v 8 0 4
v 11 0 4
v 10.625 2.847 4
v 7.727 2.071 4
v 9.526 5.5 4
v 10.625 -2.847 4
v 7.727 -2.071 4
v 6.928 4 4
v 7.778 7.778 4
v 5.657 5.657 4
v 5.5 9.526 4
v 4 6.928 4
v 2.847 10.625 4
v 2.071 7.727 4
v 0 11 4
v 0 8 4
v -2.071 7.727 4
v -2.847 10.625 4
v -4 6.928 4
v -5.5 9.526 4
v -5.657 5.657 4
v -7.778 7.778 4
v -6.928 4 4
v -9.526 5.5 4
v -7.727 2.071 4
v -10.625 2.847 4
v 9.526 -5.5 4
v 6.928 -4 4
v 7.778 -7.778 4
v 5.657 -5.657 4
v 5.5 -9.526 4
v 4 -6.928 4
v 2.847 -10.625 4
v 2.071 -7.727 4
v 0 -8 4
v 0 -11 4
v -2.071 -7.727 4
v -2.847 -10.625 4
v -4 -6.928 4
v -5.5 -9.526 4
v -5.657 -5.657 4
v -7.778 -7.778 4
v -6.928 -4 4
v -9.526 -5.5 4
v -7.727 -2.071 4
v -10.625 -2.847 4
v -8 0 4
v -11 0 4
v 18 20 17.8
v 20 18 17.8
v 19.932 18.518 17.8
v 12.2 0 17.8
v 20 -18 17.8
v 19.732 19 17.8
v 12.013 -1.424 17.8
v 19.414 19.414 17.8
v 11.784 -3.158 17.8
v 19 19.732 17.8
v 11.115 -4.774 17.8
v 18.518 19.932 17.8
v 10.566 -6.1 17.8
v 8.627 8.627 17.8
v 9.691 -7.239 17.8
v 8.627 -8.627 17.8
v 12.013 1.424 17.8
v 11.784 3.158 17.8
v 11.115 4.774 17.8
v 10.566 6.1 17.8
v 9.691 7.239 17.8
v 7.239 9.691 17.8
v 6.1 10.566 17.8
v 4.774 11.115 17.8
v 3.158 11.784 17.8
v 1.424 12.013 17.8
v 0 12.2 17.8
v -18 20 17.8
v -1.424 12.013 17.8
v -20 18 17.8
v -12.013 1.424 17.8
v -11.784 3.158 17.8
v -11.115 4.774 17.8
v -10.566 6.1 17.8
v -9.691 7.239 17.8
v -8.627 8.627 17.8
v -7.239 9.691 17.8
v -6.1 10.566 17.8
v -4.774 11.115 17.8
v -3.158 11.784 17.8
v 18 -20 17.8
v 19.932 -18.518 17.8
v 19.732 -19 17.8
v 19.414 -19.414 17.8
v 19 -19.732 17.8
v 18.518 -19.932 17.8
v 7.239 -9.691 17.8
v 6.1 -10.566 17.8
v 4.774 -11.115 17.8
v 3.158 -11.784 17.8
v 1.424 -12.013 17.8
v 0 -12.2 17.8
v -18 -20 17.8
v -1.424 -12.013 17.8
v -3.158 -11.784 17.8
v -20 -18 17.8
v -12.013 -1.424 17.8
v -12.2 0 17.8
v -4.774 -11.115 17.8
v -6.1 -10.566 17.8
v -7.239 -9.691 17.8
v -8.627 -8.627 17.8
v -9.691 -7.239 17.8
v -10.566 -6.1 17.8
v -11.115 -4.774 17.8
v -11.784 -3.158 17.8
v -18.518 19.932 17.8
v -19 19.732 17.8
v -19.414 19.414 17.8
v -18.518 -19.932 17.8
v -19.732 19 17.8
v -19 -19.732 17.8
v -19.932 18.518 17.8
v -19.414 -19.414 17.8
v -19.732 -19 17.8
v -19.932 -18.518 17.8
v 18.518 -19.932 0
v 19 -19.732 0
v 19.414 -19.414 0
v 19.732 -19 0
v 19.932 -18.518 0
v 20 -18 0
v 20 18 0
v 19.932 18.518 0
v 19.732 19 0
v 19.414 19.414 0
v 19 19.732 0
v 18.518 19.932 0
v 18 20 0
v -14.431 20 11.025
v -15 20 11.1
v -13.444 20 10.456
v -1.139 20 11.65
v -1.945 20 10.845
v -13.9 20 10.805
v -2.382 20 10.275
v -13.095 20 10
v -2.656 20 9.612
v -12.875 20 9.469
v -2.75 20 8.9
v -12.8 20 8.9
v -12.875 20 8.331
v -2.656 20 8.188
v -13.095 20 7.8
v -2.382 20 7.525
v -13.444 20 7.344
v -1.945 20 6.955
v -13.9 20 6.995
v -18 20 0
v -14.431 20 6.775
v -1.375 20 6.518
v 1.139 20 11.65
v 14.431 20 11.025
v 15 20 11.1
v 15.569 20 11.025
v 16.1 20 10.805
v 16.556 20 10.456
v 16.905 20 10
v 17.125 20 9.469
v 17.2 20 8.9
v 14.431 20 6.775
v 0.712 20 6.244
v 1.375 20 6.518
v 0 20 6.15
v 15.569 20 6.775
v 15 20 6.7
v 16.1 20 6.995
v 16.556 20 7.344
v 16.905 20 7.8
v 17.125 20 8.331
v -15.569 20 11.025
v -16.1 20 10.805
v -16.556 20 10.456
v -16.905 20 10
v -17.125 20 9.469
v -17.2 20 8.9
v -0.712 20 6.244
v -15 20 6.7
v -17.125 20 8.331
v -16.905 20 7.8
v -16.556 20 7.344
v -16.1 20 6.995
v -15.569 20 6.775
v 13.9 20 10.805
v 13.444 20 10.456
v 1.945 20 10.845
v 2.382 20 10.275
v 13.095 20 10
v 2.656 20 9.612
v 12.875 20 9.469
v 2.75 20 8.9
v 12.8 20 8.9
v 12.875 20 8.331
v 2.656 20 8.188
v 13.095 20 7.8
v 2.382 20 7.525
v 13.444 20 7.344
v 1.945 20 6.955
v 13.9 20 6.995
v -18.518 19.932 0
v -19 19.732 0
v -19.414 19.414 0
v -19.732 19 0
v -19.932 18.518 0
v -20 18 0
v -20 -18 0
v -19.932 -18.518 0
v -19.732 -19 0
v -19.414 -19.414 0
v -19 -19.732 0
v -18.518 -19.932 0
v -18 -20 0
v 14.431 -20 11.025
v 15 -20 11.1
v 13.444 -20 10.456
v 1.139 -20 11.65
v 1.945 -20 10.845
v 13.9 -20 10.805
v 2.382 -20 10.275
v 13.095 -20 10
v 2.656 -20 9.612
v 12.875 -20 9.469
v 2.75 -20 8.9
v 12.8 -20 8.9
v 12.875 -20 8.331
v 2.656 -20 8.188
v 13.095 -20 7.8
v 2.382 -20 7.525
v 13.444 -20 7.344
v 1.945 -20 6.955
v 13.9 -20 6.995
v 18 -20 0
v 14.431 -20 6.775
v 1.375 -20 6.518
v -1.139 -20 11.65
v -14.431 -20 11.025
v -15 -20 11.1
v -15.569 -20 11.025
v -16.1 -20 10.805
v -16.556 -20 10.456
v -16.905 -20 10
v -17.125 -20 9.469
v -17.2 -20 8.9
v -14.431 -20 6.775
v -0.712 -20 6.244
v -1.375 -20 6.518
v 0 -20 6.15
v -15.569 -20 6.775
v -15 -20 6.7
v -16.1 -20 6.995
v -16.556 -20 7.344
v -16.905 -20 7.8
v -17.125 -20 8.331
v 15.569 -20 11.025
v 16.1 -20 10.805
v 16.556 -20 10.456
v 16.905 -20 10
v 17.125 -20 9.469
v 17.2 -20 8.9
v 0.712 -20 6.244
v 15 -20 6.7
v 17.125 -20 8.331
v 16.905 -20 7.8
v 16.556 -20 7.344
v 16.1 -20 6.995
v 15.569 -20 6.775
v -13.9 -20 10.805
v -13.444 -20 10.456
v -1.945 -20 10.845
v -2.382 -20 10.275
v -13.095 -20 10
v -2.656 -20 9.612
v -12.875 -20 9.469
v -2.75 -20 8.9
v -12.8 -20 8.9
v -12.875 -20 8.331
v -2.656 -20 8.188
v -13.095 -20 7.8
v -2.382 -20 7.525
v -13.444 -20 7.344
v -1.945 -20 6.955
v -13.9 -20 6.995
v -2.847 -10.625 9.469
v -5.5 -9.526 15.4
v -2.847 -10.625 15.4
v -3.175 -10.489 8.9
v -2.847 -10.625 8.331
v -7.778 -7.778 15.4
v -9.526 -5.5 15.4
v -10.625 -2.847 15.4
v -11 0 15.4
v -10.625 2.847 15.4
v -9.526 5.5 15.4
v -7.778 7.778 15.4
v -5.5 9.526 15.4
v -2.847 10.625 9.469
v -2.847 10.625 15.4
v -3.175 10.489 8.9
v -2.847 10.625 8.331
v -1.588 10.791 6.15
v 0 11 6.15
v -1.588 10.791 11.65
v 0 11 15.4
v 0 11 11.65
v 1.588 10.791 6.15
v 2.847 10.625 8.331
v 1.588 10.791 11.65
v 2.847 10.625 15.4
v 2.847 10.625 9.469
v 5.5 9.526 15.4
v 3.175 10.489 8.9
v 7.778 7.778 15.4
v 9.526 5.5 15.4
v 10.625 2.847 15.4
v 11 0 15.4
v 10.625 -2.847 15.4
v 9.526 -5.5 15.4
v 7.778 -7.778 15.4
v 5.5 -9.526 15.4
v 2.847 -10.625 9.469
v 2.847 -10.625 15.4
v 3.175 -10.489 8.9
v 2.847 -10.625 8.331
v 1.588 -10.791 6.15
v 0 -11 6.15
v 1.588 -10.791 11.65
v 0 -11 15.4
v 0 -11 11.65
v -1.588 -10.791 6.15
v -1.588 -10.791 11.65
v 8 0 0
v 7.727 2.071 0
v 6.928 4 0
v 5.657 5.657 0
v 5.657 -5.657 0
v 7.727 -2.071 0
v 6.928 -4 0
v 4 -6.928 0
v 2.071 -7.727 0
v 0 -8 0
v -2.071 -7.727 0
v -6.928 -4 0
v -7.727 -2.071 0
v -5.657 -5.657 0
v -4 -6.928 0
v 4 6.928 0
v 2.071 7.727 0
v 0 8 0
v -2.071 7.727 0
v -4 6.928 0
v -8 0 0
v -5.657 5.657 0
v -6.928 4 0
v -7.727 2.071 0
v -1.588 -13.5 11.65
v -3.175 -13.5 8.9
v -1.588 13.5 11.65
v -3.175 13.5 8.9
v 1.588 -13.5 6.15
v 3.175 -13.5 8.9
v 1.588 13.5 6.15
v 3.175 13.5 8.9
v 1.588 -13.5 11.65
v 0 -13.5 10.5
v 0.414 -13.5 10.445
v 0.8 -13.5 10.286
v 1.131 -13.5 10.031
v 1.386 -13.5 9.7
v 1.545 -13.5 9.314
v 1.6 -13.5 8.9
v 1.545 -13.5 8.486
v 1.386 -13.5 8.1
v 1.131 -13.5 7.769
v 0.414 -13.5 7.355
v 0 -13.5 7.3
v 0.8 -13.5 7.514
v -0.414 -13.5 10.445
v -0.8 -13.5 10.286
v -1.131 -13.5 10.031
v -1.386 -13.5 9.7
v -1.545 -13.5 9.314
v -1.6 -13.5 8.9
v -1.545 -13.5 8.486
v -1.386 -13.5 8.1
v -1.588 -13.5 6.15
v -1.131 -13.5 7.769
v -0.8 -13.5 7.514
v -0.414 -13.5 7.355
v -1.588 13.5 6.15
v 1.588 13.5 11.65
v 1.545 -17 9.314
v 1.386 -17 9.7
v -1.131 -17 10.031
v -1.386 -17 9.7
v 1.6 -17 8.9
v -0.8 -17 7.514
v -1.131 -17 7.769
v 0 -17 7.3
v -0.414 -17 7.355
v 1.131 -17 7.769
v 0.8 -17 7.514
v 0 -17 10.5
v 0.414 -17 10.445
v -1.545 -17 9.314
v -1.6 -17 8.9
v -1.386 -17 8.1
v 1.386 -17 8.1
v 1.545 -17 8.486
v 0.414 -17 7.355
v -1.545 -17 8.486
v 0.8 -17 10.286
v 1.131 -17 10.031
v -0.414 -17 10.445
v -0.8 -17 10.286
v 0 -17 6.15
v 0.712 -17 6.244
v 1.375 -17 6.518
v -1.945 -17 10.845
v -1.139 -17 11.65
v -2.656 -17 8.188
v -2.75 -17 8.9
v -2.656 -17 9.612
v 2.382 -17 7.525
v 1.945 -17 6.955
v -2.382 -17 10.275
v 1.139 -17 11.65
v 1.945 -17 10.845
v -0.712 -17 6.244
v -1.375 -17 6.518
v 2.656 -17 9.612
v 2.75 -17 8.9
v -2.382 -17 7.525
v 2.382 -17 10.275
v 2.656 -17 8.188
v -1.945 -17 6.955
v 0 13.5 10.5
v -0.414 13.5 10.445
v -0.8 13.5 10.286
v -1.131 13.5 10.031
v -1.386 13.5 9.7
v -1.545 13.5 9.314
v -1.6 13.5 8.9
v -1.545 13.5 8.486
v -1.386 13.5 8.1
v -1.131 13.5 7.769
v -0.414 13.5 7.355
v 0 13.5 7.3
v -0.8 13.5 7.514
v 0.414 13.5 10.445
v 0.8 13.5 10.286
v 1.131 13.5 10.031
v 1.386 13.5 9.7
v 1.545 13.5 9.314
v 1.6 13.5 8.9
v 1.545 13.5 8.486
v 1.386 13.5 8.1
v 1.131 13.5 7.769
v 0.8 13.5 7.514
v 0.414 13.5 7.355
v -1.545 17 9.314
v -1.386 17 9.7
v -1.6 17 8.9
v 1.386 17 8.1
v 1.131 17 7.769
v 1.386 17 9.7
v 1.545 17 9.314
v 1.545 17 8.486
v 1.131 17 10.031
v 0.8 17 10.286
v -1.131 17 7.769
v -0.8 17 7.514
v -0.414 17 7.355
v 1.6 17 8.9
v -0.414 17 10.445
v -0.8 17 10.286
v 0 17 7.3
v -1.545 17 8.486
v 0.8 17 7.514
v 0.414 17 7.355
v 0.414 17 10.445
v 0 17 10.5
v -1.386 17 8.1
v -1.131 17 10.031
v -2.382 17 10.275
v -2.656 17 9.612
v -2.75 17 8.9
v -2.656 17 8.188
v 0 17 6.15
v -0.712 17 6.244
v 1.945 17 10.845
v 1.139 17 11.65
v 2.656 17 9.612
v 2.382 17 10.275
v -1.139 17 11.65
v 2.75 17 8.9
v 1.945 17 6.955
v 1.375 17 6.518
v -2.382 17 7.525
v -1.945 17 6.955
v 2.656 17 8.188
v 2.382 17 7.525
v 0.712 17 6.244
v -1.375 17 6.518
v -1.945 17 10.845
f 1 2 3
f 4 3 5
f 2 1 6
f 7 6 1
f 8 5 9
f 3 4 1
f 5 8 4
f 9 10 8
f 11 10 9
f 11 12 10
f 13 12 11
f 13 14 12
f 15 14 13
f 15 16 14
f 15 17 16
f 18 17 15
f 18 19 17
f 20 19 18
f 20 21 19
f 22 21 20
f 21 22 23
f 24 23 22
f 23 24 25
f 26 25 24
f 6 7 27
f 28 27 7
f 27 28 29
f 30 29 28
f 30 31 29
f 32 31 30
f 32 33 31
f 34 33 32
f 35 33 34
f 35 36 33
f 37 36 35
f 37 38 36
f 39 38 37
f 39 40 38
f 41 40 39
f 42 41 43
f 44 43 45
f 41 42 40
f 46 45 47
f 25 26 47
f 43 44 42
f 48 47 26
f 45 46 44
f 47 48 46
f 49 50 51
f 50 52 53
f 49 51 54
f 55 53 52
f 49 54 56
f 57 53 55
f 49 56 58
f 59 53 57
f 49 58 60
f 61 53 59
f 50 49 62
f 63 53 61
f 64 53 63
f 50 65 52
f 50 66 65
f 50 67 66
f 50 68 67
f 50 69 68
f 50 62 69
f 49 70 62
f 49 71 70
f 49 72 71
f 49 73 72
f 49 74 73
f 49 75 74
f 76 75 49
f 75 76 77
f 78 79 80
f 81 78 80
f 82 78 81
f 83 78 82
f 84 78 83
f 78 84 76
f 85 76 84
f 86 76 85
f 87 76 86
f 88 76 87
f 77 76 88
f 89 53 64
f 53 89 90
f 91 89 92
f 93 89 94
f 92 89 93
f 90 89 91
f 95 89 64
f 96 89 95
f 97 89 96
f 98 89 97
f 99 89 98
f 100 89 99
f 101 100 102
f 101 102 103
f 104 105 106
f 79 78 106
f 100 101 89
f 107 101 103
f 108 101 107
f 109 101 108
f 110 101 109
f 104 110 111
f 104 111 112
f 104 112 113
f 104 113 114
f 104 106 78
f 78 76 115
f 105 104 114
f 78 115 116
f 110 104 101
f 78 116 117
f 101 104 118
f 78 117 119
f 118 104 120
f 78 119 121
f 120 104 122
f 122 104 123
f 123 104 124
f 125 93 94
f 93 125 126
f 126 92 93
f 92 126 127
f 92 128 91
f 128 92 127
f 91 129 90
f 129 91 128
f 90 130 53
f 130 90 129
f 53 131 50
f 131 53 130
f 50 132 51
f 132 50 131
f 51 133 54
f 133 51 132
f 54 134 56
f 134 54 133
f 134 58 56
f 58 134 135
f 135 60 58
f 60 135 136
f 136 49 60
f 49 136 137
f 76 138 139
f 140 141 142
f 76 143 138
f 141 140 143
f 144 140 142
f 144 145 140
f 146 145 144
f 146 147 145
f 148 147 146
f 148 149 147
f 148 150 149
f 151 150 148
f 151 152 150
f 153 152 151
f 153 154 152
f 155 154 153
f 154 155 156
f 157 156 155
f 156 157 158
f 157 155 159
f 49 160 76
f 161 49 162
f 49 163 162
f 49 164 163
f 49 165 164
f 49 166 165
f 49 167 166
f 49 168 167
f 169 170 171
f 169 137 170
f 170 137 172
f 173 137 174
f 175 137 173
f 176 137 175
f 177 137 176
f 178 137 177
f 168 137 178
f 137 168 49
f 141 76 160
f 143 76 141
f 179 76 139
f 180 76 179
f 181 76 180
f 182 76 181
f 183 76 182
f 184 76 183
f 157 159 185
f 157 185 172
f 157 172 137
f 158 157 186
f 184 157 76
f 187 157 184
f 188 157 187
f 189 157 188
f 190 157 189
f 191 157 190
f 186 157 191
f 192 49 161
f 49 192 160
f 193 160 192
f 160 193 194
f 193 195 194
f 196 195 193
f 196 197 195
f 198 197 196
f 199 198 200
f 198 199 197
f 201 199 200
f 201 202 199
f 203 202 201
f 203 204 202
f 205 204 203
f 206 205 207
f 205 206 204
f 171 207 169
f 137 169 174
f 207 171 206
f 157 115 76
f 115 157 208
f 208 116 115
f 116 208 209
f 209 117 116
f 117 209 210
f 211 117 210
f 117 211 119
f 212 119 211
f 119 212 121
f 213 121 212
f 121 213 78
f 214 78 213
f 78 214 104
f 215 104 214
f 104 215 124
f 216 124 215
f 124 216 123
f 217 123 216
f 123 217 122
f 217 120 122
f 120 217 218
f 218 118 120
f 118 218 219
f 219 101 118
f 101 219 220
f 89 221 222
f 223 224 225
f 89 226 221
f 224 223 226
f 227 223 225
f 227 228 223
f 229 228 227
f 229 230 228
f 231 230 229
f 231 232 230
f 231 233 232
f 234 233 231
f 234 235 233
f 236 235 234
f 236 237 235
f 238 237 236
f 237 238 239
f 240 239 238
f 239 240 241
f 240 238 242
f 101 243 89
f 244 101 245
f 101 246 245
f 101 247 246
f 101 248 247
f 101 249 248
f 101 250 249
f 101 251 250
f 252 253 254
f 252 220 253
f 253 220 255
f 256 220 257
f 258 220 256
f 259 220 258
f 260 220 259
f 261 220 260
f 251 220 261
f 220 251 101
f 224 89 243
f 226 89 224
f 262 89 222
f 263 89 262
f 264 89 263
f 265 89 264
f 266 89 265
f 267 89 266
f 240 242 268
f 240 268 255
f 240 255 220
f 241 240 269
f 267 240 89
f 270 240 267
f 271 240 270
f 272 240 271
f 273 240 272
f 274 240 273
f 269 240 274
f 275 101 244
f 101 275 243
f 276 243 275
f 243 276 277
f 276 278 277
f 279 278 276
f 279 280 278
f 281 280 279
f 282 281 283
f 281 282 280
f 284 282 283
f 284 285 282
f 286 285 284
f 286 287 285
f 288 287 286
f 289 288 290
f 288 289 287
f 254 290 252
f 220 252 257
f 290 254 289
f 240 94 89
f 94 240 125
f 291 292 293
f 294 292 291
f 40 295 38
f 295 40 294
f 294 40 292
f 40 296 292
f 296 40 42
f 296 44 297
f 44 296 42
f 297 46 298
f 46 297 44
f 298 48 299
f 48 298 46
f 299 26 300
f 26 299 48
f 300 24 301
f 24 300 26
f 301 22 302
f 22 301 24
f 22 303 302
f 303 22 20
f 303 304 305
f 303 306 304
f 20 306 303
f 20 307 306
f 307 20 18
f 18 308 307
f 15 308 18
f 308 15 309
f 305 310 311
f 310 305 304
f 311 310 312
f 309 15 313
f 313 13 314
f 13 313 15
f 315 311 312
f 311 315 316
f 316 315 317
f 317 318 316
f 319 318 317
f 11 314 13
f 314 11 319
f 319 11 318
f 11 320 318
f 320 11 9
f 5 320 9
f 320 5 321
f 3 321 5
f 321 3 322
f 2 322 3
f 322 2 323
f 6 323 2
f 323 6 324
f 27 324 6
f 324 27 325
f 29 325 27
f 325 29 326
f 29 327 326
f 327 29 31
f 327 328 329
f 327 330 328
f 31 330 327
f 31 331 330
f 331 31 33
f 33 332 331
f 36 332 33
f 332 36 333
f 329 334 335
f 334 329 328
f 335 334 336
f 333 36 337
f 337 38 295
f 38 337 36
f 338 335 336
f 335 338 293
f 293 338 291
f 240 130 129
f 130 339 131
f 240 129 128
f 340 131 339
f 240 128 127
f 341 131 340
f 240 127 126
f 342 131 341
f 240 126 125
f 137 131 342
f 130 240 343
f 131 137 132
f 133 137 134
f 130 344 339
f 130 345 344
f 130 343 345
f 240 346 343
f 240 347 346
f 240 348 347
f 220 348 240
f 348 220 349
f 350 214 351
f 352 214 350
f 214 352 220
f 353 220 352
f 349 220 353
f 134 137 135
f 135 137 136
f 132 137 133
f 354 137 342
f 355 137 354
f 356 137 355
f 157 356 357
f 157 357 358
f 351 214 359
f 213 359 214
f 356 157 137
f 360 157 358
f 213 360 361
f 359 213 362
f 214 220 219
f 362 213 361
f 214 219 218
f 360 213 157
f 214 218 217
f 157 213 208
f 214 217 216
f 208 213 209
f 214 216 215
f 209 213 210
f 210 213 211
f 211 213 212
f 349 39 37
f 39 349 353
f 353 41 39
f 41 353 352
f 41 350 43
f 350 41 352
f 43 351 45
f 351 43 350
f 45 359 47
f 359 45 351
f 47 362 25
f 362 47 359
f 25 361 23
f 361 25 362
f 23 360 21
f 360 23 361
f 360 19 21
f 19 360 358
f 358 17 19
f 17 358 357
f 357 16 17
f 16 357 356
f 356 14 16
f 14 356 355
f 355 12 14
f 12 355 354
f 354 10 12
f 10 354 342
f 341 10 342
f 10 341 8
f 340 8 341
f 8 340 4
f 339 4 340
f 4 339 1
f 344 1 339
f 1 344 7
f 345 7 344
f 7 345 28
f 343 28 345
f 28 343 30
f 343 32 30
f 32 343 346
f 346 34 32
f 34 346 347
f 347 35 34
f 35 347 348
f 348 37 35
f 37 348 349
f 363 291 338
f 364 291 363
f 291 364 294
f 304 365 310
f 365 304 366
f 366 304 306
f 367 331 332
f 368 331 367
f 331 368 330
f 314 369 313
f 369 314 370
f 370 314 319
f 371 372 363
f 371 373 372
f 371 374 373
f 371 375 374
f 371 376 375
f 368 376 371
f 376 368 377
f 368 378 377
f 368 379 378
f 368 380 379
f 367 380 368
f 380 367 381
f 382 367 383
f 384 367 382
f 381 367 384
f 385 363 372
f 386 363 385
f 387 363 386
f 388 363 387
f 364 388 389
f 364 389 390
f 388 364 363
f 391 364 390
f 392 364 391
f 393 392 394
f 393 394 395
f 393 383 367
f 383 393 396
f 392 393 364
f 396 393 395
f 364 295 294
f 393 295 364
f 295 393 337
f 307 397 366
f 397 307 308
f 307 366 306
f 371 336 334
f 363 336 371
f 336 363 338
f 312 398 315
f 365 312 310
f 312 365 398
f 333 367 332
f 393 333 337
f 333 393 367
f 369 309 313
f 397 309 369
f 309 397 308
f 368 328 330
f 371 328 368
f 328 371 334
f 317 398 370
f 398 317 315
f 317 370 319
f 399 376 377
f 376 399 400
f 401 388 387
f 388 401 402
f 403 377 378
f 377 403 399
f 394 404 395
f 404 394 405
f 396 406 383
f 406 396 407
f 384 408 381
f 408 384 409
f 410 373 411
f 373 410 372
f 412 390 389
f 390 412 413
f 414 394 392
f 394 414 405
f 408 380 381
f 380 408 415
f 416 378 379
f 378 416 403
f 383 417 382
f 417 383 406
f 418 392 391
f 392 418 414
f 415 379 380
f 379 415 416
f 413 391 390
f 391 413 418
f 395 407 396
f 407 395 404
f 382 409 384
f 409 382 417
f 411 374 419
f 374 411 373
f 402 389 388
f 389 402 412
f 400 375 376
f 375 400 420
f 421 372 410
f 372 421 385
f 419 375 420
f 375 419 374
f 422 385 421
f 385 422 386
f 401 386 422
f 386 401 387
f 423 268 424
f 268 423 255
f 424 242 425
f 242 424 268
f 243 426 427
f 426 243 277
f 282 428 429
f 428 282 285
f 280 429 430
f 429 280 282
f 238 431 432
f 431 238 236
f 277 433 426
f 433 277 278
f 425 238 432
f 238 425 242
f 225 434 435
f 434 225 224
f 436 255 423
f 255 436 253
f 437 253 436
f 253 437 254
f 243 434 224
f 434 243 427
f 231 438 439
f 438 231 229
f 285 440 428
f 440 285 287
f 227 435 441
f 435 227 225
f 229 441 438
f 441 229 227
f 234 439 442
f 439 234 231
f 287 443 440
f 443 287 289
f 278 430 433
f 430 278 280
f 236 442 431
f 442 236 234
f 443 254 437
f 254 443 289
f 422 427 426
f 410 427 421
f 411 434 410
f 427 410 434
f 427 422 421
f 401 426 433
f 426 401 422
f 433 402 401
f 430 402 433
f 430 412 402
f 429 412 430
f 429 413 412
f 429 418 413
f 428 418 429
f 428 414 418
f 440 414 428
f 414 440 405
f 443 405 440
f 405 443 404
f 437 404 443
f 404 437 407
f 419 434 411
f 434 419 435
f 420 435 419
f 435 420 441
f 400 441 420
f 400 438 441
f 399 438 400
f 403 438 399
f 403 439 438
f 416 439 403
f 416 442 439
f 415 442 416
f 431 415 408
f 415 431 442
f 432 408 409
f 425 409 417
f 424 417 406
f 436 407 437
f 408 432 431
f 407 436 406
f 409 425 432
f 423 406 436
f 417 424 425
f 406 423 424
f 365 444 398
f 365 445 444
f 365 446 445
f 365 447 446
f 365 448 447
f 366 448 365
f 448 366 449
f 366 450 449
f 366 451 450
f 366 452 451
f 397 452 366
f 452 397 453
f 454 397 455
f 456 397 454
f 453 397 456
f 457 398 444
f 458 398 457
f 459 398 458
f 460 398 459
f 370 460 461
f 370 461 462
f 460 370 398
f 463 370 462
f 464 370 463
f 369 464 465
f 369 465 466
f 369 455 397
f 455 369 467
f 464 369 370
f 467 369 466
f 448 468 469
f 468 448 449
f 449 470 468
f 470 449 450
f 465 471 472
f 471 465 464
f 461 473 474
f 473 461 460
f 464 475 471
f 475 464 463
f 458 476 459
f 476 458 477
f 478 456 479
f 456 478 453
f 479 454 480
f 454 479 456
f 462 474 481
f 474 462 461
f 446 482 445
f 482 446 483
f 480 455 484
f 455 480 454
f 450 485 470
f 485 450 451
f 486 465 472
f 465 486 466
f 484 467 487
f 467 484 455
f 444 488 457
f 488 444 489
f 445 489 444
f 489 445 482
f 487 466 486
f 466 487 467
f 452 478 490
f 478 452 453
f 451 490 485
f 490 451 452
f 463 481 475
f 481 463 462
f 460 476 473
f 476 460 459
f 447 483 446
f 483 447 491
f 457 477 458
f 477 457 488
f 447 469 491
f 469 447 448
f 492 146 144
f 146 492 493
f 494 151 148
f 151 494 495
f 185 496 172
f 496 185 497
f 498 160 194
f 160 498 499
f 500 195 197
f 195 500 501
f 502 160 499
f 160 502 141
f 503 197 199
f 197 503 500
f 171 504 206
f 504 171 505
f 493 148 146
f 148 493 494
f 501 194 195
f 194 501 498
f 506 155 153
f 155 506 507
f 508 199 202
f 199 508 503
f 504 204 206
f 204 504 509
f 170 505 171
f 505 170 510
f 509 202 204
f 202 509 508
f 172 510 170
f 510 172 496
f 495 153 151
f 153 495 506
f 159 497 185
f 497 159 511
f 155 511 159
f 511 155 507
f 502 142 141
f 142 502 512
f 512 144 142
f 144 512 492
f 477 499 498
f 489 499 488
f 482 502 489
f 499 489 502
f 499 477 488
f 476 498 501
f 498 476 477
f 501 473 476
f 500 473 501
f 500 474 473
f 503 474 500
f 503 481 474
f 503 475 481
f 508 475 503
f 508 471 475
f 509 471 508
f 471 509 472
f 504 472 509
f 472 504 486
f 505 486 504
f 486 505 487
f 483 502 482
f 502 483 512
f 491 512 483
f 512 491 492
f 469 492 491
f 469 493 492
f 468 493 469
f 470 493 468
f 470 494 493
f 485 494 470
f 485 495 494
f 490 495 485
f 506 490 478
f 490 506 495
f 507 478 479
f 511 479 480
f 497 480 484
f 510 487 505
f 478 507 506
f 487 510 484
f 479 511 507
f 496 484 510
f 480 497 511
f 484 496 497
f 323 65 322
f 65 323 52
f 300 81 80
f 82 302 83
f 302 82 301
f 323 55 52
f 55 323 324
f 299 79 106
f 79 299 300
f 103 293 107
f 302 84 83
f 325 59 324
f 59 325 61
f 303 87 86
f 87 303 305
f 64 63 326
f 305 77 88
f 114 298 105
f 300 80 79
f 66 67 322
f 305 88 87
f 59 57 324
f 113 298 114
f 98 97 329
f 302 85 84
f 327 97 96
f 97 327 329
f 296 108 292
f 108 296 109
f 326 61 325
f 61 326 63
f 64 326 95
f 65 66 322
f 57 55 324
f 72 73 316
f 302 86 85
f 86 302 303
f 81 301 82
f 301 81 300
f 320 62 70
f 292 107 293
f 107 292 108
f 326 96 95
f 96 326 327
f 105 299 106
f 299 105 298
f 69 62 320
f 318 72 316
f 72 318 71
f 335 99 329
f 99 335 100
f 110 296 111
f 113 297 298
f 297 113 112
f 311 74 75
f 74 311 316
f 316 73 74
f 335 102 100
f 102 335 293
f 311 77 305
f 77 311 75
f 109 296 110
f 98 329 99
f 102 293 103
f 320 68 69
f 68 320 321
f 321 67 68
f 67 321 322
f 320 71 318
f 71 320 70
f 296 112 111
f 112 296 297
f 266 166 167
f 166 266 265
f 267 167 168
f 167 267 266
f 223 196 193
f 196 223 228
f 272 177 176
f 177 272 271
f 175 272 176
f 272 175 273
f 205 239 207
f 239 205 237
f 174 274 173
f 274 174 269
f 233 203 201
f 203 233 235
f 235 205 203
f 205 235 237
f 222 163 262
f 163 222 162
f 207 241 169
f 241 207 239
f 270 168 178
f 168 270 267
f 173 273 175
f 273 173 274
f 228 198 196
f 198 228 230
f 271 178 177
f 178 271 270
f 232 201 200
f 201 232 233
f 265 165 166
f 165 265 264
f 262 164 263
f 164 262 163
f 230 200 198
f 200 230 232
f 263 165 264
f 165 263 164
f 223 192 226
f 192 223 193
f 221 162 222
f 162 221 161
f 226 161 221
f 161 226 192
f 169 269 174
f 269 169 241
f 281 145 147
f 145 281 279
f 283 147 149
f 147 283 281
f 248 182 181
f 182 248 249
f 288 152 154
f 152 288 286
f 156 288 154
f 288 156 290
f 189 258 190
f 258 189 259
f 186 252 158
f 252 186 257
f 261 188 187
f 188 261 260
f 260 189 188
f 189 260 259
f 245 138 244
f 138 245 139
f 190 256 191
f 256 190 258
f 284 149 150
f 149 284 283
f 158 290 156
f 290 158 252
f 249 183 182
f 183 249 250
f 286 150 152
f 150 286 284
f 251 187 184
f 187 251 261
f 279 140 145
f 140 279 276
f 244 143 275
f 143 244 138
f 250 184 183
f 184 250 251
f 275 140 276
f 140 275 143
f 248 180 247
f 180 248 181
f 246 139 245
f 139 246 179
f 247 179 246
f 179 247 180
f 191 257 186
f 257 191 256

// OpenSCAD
// Z-Bracket - Simple with Nut Holes

// højde af ekstra stykke til montering af plader
mount_height = 4;
// afstand fra center(z-aksen) til midten af monteringshuller
plate_mount_x_offset = 15;

hole_widen=0.0;
// hole_widen=1.0;
// 608 Bearing Dimensions
bearing_608_od=22.0+hole_widen;
bearing_608_id=8.0;
bearing_608_h=7.0;
// ISO Metric Hardware
m3_d=3.0+hole_widen;
m3_scs_head_h=3.0;
m3_scs_head_d=5.5+hole_widen;
m3_scs_head_hex_w=2.5;
m3_nut_din934_w=5.5+hole_widen;
m3_nut_din934_h=2.4;

m4_d=4.2+hole_widen;

// MakerBot Cupcake Z-Bracket Critical Dimensions
z_bracket_w = 40.0; // Z Bracket Width
z_bracket_l = 40.0; // Z Bracket Length
z_bracket_h = 5.0+2*m3_nut_din934_h;
z_bracket_h_ext = z_bracket_h + mount_height;
z_bracket_corner_r = 2.0; // Z Bracket Corner Radius

module Nut_Hole_2D(w=1.0) {
    intersection_for(i=[0:2]) {
        rotate([0,0,360*i/3]) square(size=[2*w,w],center=true);
    }
}


module TearDrop_Truncated_2D(diameter=1.0) {
    $fa=15.0;
    $fs=0.1;
    difference() {
        union() {
            circle(r=diameter/2);
            rotate(45) square(size=diameter/2,center=false);
        }
        translate([-diameter/2,diameter/2]) square(size=diameter);
    }
}

module Z_Bracket_Holes_2D() {
    $fa=15.0;
    $fs=0.1;
    union() {

    }
}


module Z_Bracket_ext() {
    $fa=15.0;
    $fs=0.1;
    difference() {
        union() {
            square(size=[z_bracket_w-2*z_bracket_corner_r,z_bracket_l],center=true);
            square(size=[z_bracket_w,z_bracket_l-2*z_bracket_corner_r],center=true);
            translate([z_bracket_w/2-z_bracket_corner_r,z_bracket_w/2-z_bracket_corner_r])
                circle(r=z_bracket_corner_r,center=true);
            translate([z_bracket_w/2-z_bracket_corner_r,-(z_bracket_w/2-z_bracket_corner_r)])
                circle(r=z_bracket_corner_r,center=true);
            translate([-(z_bracket_w/2-z_bracket_corner_r),-(z_bracket_w/2-z_bracket_corner_r)])
                circle(r=z_bracket_corner_r,center=true);
            translate([-(z_bracket_w/2-z_bracket_corner_r),z_bracket_w/2-z_bracket_corner_r])
                circle(r=z_bracket_corner_r,center=true);
        }
        // gennemgående hul til akse
        circle(r=bearing_608_od/2-3,center=true);
    }
}


module Z_Bracket_2D() {
    $fa=15.0;
    $fs=0.1;
    difference() {
        union() {
            square(size=[z_bracket_w-2*z_bracket_corner_r,z_bracket_l],center=true);
            square(size=[z_bracket_w,z_bracket_l-2*z_bracket_corner_r],center=true);
            translate([z_bracket_w/2-z_bracket_corner_r,z_bracket_w/2-z_bracket_corner_r])
                circle(r=z_bracket_corner_r,center=true);
            translate([z_bracket_w/2-z_bracket_corner_r,-(z_bracket_w/2-z_bracket_corner_r)])
                circle(r=z_bracket_corner_r,center=true);
            translate([-(z_bracket_w/2-z_bracket_corner_r),-(z_bracket_w/2-z_bracket_corner_r)])
                circle(r=z_bracket_corner_r,center=true);
            translate([-(z_bracket_w/2-z_bracket_corner_r),z_bracket_w/2-z_bracket_corner_r])
                circle(r=z_bracket_corner_r,center=true);
        }
        // gennemgående hul til akse
        circle(r=bearing_608_od/2,center=true);
    }
}

module Z_Bracket_Simple_Nut(extension=0.1) {
    $fa=15.0;
    $fs=0.1;
    difference() {
        union(){
            translate([0,0,mount_height])
                linear_extrude(height=z_bracket_h_ext, center=false, convexity=10)
                Z_Bracket_2D();
            linear_extrude(height=mount_height, center=false, convexity=10)
                Z_Bracket_ext();
        }
        // konveks udskæring i toppen
        translate([0,0,z_bracket_h_ext-m3_nut_din934_h+mount_height])
            cylinder(r1=bearing_608_od/2
                     , r2=bearing_608_od/2+m3_nut_din934_h
                     , h=2*m3_nut_din934_h
                     , center=false);
        for(i=[0:1]) {
            translate([0,0,z_bracket_h/2+mount_height]) rotate([90,0,360*i/2]) {
                // møtrikhul til fastmontering af leje
                linear_extrude(height=bearing_608_od/2+m3_nut_din934_h+0.1, center=false, convexity=10)
                    Nut_Hole_2D(w=m3_nut_din934_w);
                // gennemgående hul til fastmomtering af leje
                linear_extrude(height=z_bracket_w,center=false, convexity=10)
                    circle(r=m3_d/2+0.1);
                // hul til bolthoved til fastmontering af leje
                translate([0,0,z_bracket_w/2-m3_scs_head_h])
                    linear_extrude(height=m3_scs_head_h+0.1,center=false,convexity=10)
                    TearDrop_Truncated_2D(diameter=m3_scs_head_d);
            }
        }
        // huller til montering af plader
        translate([plate_mount_x_offset,0,z_bracket_h/2+mount_height]) rotate([90,0,0]) {
            linear_extrude(height=z_bracket_w,center=true, convexity=10)
                circle(r=m4_d/2+0.1);
        }
        translate([-plate_mount_x_offset,0,z_bracket_h/2+mount_height]) rotate([90,0,0]) {
            linear_extrude(height=z_bracket_w,center=true, convexity=10)
                circle(r=m4_d/2+0.1);
        }
    }
}

Z_Bracket_Simple_Nut();
